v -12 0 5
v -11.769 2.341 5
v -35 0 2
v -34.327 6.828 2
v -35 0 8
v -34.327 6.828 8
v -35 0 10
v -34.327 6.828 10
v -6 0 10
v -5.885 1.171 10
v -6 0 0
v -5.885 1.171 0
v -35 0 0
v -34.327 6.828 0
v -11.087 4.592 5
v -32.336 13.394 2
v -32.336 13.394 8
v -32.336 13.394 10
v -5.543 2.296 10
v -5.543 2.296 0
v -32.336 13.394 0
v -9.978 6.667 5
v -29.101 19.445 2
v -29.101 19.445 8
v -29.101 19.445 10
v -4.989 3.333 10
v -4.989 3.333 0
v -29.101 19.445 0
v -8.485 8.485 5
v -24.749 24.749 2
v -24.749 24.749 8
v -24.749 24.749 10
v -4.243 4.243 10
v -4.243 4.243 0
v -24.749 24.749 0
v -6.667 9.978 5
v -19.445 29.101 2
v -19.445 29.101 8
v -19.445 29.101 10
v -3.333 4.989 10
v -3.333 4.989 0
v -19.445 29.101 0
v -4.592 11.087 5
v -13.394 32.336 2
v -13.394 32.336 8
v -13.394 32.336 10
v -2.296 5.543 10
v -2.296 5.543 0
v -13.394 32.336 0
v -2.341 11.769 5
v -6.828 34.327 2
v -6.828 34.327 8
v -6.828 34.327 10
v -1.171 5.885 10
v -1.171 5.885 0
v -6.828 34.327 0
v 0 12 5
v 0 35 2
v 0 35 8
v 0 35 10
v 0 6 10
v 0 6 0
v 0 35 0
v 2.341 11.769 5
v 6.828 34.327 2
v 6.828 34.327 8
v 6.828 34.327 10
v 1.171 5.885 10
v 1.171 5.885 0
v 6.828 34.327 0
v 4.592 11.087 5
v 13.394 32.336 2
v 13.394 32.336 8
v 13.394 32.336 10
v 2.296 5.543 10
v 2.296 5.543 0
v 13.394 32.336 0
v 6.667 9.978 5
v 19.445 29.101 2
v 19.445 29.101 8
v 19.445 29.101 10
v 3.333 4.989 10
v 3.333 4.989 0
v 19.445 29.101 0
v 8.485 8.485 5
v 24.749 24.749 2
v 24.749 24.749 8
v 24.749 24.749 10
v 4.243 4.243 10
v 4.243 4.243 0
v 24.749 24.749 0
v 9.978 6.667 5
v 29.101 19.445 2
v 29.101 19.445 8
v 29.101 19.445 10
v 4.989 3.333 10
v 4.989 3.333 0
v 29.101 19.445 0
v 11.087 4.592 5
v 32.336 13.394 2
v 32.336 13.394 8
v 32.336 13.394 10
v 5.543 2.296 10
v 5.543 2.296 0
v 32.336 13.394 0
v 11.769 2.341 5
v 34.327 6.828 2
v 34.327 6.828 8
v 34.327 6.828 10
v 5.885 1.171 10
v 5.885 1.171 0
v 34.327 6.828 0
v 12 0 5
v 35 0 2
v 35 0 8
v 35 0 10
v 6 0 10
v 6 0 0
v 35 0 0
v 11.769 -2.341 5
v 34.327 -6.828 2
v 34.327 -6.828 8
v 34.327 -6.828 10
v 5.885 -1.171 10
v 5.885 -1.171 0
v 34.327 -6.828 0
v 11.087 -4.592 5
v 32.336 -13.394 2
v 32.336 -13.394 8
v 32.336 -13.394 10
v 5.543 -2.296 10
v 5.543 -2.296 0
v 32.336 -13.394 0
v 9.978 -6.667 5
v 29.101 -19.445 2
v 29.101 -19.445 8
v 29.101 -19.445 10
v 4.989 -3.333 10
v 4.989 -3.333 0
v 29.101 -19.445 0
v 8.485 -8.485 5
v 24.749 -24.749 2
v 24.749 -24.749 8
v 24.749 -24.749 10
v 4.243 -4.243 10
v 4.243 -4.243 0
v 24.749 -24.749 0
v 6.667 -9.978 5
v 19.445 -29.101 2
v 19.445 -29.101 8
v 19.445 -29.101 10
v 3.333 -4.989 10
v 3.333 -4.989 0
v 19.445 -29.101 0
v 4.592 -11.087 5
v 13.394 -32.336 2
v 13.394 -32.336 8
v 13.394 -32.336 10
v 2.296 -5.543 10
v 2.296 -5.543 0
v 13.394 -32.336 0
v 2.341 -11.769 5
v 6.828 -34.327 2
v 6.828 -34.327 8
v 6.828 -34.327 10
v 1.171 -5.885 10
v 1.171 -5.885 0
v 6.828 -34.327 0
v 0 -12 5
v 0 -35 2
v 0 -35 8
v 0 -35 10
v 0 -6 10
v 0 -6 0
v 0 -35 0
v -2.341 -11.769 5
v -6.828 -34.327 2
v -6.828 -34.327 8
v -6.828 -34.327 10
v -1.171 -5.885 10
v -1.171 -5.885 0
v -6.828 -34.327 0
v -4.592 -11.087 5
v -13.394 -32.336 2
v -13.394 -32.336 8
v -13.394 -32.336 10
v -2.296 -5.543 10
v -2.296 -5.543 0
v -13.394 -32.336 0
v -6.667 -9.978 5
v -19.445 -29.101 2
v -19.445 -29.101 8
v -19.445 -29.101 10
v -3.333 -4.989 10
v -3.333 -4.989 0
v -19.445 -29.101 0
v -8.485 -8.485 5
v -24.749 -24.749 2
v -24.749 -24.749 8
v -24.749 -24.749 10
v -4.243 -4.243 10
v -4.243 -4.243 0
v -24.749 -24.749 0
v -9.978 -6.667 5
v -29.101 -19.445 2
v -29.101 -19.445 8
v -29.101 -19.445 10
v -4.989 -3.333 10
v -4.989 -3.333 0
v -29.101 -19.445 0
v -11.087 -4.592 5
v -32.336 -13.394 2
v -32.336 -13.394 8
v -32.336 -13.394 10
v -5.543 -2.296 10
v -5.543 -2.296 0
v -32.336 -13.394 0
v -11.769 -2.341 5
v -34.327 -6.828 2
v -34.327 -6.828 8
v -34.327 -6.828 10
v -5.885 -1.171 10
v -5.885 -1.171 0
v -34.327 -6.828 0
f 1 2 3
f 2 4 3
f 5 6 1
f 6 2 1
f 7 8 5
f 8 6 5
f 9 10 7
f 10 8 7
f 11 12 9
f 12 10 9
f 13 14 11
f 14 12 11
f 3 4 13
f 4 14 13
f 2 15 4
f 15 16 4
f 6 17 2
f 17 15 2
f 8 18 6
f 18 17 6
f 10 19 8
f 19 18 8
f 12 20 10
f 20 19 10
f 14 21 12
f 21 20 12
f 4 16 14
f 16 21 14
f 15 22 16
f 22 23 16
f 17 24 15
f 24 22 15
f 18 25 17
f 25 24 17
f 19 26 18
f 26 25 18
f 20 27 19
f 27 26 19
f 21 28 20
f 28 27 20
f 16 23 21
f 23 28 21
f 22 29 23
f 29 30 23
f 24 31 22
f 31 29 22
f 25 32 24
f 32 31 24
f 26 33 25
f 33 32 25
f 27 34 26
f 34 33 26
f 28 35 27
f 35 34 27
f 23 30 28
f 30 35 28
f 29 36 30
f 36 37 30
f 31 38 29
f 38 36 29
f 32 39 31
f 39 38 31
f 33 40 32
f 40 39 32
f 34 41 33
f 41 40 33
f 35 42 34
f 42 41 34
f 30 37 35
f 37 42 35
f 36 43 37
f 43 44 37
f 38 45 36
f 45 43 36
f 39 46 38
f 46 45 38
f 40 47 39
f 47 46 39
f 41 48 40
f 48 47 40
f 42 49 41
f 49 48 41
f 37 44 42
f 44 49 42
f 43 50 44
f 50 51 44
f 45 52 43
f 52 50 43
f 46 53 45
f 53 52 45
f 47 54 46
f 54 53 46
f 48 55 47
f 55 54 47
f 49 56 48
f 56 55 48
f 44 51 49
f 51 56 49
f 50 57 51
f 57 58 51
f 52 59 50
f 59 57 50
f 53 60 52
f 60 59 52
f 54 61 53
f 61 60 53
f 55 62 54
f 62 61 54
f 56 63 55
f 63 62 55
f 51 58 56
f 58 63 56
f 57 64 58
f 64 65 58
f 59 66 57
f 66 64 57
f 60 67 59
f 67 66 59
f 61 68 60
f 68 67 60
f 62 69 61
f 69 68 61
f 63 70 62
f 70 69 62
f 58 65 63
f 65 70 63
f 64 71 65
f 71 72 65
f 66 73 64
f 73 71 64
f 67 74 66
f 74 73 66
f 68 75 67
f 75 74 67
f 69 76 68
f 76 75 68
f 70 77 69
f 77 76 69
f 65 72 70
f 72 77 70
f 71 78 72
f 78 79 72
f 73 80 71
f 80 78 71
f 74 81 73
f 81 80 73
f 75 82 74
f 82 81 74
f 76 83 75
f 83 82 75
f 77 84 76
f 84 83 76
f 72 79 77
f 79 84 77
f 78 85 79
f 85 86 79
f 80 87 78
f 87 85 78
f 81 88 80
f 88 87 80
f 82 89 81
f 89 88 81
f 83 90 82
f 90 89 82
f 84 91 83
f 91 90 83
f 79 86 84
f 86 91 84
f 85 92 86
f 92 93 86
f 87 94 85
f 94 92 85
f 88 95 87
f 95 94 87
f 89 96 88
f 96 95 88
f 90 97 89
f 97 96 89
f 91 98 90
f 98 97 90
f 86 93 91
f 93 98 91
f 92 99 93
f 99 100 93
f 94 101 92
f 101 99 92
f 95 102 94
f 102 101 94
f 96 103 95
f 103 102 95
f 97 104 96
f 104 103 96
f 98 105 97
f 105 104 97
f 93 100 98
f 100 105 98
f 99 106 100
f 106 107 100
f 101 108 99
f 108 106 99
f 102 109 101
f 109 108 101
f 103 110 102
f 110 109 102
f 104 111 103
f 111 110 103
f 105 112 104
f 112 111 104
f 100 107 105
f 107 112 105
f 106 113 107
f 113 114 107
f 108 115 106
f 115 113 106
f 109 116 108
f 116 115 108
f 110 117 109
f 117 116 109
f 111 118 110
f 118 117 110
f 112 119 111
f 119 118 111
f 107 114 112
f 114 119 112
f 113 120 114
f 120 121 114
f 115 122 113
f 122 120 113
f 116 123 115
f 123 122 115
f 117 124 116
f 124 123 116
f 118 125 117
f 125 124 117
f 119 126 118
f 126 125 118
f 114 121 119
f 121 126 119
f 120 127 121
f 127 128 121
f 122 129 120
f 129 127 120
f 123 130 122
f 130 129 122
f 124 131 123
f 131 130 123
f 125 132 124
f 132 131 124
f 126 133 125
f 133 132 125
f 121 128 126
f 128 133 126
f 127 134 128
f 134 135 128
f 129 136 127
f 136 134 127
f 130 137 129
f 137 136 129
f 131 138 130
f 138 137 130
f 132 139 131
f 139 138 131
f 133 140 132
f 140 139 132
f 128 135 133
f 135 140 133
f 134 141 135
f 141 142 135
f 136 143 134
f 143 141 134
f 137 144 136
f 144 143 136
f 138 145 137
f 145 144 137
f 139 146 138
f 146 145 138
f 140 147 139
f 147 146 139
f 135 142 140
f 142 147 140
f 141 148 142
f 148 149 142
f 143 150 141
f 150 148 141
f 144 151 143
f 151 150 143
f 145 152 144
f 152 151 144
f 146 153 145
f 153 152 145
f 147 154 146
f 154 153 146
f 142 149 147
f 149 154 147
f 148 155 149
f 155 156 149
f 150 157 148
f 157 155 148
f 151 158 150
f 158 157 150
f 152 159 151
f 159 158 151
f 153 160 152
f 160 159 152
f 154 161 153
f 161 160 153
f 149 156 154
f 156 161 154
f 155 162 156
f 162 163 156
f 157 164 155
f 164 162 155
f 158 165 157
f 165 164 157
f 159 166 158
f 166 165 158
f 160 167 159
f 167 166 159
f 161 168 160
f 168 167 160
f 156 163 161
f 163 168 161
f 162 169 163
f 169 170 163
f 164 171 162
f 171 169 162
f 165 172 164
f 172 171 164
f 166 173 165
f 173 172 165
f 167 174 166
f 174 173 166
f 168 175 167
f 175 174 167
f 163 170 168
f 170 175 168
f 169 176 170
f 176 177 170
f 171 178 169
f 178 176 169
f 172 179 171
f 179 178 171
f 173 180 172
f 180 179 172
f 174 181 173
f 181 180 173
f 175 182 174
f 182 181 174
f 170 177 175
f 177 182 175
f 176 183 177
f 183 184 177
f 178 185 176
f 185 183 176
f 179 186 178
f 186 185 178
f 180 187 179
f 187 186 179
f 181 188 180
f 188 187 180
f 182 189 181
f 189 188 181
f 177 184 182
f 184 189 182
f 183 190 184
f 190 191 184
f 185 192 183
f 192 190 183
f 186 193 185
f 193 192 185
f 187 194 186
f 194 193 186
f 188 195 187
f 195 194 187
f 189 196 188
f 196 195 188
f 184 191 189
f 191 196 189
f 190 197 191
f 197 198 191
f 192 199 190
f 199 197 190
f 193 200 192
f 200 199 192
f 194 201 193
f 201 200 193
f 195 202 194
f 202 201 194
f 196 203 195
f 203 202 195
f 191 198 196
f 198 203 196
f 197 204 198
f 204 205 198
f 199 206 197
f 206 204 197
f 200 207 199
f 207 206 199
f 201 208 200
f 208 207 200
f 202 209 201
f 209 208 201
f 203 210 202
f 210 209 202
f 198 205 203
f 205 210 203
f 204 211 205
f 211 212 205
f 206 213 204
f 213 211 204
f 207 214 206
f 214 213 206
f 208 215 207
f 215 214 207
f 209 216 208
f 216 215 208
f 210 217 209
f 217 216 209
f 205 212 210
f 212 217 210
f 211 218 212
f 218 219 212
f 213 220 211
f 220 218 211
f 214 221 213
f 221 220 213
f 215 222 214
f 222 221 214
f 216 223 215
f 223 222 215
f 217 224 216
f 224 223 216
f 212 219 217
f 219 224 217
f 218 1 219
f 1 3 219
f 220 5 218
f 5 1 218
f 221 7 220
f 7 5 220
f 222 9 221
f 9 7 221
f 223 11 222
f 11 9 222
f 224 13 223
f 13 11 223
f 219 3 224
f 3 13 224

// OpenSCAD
$fn = 32;

// ----------------------------------------------------------------------
// Revolved part: V-groove pulley R35
// ----------------------------------------------------------------------

// --- parameters (mm) ---
bore_r = 6;               // bore radius
rim_r = 35;               // rim radius
rim_t = 10;               // rim width
groove_r = 12;            // groove root radius
groove_w = 3;             // groove half width
revolve_angle = 360;      // revolve sweep, degrees

bore_d = 2 * bore_r;
rim_d = 2 * rim_r;
groove_d = 2 * groove_r;

profile = [[6, 0], [35, 0], [35, 2], [12, 5], [35, 8], [35, 10], [6, 10]];  // primary outline, 7 points, counter clockwise

// --- the one profile operation ---
rotate_extrude(angle = revolve_angle) polygon(points = profile);
